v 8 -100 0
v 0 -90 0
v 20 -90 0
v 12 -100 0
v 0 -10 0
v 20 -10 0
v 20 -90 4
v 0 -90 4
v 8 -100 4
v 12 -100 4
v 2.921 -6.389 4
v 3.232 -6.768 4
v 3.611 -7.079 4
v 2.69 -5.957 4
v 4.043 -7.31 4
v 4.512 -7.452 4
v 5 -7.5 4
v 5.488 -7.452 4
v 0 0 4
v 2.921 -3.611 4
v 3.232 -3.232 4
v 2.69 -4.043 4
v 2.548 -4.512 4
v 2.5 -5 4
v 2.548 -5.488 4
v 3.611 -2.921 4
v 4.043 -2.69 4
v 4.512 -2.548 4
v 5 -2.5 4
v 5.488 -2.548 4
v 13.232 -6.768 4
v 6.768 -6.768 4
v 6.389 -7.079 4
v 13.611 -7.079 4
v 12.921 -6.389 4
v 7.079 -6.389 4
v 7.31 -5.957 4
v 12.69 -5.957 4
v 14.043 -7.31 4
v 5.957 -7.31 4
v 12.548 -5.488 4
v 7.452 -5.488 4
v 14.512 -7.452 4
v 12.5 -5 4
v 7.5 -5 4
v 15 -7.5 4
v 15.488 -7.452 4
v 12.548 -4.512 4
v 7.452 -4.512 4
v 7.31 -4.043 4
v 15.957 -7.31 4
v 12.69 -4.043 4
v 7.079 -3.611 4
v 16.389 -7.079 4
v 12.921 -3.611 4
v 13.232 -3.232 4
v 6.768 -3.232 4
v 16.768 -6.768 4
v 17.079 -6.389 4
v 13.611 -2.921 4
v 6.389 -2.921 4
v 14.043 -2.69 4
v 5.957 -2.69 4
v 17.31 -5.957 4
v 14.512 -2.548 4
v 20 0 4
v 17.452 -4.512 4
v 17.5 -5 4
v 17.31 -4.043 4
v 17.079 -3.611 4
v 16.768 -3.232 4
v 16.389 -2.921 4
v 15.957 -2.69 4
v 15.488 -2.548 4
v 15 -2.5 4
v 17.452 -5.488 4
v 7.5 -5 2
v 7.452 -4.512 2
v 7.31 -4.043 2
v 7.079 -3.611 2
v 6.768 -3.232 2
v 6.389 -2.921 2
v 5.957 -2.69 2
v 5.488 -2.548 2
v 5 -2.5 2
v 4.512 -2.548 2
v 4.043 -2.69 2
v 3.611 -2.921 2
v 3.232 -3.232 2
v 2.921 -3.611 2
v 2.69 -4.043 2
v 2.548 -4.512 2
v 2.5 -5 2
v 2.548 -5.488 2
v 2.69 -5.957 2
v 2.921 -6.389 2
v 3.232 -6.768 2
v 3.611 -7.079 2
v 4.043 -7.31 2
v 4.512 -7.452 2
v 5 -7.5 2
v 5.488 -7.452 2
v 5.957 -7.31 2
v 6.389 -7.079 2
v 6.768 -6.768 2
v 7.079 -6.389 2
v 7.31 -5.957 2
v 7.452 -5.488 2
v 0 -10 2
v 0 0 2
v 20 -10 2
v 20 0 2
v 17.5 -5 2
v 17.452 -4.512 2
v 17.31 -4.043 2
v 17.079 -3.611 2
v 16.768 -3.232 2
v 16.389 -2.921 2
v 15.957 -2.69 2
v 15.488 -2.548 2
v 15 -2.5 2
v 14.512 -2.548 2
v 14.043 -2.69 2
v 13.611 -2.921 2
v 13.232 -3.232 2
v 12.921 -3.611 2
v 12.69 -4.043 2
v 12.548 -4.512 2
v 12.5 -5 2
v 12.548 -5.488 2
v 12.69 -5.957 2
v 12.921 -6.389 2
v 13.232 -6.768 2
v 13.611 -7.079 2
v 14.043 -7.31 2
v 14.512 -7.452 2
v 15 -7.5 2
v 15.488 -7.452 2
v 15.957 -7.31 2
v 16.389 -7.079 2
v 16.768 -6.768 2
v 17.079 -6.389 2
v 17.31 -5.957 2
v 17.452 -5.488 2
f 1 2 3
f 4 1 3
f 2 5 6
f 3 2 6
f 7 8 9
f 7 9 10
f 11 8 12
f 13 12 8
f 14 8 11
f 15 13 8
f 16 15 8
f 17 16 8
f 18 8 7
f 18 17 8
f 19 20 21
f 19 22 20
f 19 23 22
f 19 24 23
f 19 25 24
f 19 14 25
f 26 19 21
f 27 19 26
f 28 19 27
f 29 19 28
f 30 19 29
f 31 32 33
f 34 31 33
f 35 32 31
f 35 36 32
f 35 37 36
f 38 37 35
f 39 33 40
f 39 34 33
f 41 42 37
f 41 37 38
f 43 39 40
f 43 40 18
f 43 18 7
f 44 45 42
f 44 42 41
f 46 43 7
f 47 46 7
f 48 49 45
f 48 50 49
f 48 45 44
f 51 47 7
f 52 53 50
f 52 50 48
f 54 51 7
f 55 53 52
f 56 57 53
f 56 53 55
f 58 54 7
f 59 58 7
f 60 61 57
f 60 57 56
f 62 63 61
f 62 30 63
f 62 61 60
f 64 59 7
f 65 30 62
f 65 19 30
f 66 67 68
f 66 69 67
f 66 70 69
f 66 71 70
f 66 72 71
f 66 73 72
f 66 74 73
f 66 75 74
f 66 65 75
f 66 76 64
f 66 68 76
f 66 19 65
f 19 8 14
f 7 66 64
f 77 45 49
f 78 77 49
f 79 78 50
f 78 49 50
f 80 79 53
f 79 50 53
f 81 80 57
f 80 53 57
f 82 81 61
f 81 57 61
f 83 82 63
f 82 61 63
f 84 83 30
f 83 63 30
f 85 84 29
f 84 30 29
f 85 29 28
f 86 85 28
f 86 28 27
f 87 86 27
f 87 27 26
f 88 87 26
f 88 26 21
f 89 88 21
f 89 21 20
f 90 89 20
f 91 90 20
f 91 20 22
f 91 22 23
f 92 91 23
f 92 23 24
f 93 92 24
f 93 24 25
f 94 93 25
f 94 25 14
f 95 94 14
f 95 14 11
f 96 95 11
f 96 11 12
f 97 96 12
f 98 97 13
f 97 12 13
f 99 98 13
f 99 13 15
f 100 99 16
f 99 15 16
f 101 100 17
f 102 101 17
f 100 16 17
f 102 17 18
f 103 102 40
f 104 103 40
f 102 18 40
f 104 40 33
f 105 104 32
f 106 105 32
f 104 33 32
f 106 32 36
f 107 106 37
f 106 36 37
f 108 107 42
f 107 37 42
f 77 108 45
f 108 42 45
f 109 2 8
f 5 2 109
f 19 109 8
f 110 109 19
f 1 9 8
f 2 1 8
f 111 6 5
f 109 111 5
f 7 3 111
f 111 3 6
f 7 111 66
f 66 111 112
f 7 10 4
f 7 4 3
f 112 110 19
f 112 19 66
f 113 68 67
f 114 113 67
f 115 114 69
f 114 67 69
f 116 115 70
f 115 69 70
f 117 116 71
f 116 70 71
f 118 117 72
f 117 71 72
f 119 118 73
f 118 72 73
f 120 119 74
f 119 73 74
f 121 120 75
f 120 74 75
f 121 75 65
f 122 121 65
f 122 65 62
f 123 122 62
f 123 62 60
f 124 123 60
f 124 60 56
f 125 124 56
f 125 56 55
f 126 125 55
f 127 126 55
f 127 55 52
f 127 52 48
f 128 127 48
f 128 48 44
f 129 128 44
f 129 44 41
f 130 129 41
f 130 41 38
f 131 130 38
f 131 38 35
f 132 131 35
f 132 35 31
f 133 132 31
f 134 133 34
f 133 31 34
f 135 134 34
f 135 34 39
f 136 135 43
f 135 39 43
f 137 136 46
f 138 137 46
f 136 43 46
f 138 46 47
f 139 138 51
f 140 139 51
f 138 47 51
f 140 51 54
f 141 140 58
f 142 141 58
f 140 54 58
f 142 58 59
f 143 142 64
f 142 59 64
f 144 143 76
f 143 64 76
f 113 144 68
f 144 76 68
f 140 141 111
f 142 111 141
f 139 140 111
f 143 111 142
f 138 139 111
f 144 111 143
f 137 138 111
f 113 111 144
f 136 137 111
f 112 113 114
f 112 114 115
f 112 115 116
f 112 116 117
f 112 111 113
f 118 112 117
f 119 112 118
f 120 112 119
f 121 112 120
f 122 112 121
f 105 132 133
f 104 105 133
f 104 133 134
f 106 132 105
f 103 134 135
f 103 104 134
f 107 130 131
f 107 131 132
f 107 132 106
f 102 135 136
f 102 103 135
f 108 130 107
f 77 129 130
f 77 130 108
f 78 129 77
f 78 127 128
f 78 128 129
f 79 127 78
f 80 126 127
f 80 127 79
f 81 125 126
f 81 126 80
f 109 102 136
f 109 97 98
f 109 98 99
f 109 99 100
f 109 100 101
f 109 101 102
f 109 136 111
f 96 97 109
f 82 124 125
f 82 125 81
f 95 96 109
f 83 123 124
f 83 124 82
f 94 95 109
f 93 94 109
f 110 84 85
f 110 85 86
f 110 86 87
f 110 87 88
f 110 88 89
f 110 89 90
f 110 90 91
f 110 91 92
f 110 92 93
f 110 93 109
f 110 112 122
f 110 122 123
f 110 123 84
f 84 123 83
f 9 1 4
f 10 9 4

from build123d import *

# Parameters (mm, degrees)
SKETCH_1_W          = 20
SKETCH_1_H          = 100
EXTRUDE_1_DEPTH     = 4
SKETCH_2_R          = 2.5
CUT_EXTRUDE_1_DEPTH = 103.058806577
SKETCH_3_W          = 20
SKETCH_3_H          = 10
CUT_EXTRUDE_2_DEPTH = 2
CUT_EXTRUDE_3_DEPTH = 103.058806577


with BuildPart() as part:
    # 草图1 → 凸台-拉伸1 (new body)
    with BuildSketch(Plane.XY):
        with Locations((10, -50)):
            Rectangle(SKETCH_1_W, SKETCH_1_H)
    extrude(amount=EXTRUDE_1_DEPTH)

    # 草图2 → 切除-拉伸1 (cut, through all)
    with BuildSketch(Plane.XY.offset(4)):
        with Locations((5, -5)):
            Circle(SKETCH_2_R)
        with Locations((15, -5)):
            Circle(SKETCH_2_R)
    extrude(amount=-CUT_EXTRUDE_1_DEPTH, mode=Mode.SUBTRACT)

    # 草图3 → 切除-拉伸2 (cut)
    with BuildSketch(Plane(origin=(0, 0, 0), x_dir=(-1, 0, 0), z_dir=(0, 0, -1))):
        with Locations((-10, -5)):
            Rectangle(SKETCH_3_W, SKETCH_3_H)
    extrude(amount=-CUT_EXTRUDE_2_DEPTH, mode=Mode.SUBTRACT)

    # 草图4 → 切除-拉伸3 (cut, through all)
    with BuildSketch(Plane.XY.offset(4)):
        Polygon((0, -90), (0, -100), (8, -100), align=None)
        Polygon((20, -100), (12, -100), (20, -90), align=None)
    extrude(amount=-CUT_EXTRUDE_3_DEPTH, mode=Mode.SUBTRACT)


solid = part.part
